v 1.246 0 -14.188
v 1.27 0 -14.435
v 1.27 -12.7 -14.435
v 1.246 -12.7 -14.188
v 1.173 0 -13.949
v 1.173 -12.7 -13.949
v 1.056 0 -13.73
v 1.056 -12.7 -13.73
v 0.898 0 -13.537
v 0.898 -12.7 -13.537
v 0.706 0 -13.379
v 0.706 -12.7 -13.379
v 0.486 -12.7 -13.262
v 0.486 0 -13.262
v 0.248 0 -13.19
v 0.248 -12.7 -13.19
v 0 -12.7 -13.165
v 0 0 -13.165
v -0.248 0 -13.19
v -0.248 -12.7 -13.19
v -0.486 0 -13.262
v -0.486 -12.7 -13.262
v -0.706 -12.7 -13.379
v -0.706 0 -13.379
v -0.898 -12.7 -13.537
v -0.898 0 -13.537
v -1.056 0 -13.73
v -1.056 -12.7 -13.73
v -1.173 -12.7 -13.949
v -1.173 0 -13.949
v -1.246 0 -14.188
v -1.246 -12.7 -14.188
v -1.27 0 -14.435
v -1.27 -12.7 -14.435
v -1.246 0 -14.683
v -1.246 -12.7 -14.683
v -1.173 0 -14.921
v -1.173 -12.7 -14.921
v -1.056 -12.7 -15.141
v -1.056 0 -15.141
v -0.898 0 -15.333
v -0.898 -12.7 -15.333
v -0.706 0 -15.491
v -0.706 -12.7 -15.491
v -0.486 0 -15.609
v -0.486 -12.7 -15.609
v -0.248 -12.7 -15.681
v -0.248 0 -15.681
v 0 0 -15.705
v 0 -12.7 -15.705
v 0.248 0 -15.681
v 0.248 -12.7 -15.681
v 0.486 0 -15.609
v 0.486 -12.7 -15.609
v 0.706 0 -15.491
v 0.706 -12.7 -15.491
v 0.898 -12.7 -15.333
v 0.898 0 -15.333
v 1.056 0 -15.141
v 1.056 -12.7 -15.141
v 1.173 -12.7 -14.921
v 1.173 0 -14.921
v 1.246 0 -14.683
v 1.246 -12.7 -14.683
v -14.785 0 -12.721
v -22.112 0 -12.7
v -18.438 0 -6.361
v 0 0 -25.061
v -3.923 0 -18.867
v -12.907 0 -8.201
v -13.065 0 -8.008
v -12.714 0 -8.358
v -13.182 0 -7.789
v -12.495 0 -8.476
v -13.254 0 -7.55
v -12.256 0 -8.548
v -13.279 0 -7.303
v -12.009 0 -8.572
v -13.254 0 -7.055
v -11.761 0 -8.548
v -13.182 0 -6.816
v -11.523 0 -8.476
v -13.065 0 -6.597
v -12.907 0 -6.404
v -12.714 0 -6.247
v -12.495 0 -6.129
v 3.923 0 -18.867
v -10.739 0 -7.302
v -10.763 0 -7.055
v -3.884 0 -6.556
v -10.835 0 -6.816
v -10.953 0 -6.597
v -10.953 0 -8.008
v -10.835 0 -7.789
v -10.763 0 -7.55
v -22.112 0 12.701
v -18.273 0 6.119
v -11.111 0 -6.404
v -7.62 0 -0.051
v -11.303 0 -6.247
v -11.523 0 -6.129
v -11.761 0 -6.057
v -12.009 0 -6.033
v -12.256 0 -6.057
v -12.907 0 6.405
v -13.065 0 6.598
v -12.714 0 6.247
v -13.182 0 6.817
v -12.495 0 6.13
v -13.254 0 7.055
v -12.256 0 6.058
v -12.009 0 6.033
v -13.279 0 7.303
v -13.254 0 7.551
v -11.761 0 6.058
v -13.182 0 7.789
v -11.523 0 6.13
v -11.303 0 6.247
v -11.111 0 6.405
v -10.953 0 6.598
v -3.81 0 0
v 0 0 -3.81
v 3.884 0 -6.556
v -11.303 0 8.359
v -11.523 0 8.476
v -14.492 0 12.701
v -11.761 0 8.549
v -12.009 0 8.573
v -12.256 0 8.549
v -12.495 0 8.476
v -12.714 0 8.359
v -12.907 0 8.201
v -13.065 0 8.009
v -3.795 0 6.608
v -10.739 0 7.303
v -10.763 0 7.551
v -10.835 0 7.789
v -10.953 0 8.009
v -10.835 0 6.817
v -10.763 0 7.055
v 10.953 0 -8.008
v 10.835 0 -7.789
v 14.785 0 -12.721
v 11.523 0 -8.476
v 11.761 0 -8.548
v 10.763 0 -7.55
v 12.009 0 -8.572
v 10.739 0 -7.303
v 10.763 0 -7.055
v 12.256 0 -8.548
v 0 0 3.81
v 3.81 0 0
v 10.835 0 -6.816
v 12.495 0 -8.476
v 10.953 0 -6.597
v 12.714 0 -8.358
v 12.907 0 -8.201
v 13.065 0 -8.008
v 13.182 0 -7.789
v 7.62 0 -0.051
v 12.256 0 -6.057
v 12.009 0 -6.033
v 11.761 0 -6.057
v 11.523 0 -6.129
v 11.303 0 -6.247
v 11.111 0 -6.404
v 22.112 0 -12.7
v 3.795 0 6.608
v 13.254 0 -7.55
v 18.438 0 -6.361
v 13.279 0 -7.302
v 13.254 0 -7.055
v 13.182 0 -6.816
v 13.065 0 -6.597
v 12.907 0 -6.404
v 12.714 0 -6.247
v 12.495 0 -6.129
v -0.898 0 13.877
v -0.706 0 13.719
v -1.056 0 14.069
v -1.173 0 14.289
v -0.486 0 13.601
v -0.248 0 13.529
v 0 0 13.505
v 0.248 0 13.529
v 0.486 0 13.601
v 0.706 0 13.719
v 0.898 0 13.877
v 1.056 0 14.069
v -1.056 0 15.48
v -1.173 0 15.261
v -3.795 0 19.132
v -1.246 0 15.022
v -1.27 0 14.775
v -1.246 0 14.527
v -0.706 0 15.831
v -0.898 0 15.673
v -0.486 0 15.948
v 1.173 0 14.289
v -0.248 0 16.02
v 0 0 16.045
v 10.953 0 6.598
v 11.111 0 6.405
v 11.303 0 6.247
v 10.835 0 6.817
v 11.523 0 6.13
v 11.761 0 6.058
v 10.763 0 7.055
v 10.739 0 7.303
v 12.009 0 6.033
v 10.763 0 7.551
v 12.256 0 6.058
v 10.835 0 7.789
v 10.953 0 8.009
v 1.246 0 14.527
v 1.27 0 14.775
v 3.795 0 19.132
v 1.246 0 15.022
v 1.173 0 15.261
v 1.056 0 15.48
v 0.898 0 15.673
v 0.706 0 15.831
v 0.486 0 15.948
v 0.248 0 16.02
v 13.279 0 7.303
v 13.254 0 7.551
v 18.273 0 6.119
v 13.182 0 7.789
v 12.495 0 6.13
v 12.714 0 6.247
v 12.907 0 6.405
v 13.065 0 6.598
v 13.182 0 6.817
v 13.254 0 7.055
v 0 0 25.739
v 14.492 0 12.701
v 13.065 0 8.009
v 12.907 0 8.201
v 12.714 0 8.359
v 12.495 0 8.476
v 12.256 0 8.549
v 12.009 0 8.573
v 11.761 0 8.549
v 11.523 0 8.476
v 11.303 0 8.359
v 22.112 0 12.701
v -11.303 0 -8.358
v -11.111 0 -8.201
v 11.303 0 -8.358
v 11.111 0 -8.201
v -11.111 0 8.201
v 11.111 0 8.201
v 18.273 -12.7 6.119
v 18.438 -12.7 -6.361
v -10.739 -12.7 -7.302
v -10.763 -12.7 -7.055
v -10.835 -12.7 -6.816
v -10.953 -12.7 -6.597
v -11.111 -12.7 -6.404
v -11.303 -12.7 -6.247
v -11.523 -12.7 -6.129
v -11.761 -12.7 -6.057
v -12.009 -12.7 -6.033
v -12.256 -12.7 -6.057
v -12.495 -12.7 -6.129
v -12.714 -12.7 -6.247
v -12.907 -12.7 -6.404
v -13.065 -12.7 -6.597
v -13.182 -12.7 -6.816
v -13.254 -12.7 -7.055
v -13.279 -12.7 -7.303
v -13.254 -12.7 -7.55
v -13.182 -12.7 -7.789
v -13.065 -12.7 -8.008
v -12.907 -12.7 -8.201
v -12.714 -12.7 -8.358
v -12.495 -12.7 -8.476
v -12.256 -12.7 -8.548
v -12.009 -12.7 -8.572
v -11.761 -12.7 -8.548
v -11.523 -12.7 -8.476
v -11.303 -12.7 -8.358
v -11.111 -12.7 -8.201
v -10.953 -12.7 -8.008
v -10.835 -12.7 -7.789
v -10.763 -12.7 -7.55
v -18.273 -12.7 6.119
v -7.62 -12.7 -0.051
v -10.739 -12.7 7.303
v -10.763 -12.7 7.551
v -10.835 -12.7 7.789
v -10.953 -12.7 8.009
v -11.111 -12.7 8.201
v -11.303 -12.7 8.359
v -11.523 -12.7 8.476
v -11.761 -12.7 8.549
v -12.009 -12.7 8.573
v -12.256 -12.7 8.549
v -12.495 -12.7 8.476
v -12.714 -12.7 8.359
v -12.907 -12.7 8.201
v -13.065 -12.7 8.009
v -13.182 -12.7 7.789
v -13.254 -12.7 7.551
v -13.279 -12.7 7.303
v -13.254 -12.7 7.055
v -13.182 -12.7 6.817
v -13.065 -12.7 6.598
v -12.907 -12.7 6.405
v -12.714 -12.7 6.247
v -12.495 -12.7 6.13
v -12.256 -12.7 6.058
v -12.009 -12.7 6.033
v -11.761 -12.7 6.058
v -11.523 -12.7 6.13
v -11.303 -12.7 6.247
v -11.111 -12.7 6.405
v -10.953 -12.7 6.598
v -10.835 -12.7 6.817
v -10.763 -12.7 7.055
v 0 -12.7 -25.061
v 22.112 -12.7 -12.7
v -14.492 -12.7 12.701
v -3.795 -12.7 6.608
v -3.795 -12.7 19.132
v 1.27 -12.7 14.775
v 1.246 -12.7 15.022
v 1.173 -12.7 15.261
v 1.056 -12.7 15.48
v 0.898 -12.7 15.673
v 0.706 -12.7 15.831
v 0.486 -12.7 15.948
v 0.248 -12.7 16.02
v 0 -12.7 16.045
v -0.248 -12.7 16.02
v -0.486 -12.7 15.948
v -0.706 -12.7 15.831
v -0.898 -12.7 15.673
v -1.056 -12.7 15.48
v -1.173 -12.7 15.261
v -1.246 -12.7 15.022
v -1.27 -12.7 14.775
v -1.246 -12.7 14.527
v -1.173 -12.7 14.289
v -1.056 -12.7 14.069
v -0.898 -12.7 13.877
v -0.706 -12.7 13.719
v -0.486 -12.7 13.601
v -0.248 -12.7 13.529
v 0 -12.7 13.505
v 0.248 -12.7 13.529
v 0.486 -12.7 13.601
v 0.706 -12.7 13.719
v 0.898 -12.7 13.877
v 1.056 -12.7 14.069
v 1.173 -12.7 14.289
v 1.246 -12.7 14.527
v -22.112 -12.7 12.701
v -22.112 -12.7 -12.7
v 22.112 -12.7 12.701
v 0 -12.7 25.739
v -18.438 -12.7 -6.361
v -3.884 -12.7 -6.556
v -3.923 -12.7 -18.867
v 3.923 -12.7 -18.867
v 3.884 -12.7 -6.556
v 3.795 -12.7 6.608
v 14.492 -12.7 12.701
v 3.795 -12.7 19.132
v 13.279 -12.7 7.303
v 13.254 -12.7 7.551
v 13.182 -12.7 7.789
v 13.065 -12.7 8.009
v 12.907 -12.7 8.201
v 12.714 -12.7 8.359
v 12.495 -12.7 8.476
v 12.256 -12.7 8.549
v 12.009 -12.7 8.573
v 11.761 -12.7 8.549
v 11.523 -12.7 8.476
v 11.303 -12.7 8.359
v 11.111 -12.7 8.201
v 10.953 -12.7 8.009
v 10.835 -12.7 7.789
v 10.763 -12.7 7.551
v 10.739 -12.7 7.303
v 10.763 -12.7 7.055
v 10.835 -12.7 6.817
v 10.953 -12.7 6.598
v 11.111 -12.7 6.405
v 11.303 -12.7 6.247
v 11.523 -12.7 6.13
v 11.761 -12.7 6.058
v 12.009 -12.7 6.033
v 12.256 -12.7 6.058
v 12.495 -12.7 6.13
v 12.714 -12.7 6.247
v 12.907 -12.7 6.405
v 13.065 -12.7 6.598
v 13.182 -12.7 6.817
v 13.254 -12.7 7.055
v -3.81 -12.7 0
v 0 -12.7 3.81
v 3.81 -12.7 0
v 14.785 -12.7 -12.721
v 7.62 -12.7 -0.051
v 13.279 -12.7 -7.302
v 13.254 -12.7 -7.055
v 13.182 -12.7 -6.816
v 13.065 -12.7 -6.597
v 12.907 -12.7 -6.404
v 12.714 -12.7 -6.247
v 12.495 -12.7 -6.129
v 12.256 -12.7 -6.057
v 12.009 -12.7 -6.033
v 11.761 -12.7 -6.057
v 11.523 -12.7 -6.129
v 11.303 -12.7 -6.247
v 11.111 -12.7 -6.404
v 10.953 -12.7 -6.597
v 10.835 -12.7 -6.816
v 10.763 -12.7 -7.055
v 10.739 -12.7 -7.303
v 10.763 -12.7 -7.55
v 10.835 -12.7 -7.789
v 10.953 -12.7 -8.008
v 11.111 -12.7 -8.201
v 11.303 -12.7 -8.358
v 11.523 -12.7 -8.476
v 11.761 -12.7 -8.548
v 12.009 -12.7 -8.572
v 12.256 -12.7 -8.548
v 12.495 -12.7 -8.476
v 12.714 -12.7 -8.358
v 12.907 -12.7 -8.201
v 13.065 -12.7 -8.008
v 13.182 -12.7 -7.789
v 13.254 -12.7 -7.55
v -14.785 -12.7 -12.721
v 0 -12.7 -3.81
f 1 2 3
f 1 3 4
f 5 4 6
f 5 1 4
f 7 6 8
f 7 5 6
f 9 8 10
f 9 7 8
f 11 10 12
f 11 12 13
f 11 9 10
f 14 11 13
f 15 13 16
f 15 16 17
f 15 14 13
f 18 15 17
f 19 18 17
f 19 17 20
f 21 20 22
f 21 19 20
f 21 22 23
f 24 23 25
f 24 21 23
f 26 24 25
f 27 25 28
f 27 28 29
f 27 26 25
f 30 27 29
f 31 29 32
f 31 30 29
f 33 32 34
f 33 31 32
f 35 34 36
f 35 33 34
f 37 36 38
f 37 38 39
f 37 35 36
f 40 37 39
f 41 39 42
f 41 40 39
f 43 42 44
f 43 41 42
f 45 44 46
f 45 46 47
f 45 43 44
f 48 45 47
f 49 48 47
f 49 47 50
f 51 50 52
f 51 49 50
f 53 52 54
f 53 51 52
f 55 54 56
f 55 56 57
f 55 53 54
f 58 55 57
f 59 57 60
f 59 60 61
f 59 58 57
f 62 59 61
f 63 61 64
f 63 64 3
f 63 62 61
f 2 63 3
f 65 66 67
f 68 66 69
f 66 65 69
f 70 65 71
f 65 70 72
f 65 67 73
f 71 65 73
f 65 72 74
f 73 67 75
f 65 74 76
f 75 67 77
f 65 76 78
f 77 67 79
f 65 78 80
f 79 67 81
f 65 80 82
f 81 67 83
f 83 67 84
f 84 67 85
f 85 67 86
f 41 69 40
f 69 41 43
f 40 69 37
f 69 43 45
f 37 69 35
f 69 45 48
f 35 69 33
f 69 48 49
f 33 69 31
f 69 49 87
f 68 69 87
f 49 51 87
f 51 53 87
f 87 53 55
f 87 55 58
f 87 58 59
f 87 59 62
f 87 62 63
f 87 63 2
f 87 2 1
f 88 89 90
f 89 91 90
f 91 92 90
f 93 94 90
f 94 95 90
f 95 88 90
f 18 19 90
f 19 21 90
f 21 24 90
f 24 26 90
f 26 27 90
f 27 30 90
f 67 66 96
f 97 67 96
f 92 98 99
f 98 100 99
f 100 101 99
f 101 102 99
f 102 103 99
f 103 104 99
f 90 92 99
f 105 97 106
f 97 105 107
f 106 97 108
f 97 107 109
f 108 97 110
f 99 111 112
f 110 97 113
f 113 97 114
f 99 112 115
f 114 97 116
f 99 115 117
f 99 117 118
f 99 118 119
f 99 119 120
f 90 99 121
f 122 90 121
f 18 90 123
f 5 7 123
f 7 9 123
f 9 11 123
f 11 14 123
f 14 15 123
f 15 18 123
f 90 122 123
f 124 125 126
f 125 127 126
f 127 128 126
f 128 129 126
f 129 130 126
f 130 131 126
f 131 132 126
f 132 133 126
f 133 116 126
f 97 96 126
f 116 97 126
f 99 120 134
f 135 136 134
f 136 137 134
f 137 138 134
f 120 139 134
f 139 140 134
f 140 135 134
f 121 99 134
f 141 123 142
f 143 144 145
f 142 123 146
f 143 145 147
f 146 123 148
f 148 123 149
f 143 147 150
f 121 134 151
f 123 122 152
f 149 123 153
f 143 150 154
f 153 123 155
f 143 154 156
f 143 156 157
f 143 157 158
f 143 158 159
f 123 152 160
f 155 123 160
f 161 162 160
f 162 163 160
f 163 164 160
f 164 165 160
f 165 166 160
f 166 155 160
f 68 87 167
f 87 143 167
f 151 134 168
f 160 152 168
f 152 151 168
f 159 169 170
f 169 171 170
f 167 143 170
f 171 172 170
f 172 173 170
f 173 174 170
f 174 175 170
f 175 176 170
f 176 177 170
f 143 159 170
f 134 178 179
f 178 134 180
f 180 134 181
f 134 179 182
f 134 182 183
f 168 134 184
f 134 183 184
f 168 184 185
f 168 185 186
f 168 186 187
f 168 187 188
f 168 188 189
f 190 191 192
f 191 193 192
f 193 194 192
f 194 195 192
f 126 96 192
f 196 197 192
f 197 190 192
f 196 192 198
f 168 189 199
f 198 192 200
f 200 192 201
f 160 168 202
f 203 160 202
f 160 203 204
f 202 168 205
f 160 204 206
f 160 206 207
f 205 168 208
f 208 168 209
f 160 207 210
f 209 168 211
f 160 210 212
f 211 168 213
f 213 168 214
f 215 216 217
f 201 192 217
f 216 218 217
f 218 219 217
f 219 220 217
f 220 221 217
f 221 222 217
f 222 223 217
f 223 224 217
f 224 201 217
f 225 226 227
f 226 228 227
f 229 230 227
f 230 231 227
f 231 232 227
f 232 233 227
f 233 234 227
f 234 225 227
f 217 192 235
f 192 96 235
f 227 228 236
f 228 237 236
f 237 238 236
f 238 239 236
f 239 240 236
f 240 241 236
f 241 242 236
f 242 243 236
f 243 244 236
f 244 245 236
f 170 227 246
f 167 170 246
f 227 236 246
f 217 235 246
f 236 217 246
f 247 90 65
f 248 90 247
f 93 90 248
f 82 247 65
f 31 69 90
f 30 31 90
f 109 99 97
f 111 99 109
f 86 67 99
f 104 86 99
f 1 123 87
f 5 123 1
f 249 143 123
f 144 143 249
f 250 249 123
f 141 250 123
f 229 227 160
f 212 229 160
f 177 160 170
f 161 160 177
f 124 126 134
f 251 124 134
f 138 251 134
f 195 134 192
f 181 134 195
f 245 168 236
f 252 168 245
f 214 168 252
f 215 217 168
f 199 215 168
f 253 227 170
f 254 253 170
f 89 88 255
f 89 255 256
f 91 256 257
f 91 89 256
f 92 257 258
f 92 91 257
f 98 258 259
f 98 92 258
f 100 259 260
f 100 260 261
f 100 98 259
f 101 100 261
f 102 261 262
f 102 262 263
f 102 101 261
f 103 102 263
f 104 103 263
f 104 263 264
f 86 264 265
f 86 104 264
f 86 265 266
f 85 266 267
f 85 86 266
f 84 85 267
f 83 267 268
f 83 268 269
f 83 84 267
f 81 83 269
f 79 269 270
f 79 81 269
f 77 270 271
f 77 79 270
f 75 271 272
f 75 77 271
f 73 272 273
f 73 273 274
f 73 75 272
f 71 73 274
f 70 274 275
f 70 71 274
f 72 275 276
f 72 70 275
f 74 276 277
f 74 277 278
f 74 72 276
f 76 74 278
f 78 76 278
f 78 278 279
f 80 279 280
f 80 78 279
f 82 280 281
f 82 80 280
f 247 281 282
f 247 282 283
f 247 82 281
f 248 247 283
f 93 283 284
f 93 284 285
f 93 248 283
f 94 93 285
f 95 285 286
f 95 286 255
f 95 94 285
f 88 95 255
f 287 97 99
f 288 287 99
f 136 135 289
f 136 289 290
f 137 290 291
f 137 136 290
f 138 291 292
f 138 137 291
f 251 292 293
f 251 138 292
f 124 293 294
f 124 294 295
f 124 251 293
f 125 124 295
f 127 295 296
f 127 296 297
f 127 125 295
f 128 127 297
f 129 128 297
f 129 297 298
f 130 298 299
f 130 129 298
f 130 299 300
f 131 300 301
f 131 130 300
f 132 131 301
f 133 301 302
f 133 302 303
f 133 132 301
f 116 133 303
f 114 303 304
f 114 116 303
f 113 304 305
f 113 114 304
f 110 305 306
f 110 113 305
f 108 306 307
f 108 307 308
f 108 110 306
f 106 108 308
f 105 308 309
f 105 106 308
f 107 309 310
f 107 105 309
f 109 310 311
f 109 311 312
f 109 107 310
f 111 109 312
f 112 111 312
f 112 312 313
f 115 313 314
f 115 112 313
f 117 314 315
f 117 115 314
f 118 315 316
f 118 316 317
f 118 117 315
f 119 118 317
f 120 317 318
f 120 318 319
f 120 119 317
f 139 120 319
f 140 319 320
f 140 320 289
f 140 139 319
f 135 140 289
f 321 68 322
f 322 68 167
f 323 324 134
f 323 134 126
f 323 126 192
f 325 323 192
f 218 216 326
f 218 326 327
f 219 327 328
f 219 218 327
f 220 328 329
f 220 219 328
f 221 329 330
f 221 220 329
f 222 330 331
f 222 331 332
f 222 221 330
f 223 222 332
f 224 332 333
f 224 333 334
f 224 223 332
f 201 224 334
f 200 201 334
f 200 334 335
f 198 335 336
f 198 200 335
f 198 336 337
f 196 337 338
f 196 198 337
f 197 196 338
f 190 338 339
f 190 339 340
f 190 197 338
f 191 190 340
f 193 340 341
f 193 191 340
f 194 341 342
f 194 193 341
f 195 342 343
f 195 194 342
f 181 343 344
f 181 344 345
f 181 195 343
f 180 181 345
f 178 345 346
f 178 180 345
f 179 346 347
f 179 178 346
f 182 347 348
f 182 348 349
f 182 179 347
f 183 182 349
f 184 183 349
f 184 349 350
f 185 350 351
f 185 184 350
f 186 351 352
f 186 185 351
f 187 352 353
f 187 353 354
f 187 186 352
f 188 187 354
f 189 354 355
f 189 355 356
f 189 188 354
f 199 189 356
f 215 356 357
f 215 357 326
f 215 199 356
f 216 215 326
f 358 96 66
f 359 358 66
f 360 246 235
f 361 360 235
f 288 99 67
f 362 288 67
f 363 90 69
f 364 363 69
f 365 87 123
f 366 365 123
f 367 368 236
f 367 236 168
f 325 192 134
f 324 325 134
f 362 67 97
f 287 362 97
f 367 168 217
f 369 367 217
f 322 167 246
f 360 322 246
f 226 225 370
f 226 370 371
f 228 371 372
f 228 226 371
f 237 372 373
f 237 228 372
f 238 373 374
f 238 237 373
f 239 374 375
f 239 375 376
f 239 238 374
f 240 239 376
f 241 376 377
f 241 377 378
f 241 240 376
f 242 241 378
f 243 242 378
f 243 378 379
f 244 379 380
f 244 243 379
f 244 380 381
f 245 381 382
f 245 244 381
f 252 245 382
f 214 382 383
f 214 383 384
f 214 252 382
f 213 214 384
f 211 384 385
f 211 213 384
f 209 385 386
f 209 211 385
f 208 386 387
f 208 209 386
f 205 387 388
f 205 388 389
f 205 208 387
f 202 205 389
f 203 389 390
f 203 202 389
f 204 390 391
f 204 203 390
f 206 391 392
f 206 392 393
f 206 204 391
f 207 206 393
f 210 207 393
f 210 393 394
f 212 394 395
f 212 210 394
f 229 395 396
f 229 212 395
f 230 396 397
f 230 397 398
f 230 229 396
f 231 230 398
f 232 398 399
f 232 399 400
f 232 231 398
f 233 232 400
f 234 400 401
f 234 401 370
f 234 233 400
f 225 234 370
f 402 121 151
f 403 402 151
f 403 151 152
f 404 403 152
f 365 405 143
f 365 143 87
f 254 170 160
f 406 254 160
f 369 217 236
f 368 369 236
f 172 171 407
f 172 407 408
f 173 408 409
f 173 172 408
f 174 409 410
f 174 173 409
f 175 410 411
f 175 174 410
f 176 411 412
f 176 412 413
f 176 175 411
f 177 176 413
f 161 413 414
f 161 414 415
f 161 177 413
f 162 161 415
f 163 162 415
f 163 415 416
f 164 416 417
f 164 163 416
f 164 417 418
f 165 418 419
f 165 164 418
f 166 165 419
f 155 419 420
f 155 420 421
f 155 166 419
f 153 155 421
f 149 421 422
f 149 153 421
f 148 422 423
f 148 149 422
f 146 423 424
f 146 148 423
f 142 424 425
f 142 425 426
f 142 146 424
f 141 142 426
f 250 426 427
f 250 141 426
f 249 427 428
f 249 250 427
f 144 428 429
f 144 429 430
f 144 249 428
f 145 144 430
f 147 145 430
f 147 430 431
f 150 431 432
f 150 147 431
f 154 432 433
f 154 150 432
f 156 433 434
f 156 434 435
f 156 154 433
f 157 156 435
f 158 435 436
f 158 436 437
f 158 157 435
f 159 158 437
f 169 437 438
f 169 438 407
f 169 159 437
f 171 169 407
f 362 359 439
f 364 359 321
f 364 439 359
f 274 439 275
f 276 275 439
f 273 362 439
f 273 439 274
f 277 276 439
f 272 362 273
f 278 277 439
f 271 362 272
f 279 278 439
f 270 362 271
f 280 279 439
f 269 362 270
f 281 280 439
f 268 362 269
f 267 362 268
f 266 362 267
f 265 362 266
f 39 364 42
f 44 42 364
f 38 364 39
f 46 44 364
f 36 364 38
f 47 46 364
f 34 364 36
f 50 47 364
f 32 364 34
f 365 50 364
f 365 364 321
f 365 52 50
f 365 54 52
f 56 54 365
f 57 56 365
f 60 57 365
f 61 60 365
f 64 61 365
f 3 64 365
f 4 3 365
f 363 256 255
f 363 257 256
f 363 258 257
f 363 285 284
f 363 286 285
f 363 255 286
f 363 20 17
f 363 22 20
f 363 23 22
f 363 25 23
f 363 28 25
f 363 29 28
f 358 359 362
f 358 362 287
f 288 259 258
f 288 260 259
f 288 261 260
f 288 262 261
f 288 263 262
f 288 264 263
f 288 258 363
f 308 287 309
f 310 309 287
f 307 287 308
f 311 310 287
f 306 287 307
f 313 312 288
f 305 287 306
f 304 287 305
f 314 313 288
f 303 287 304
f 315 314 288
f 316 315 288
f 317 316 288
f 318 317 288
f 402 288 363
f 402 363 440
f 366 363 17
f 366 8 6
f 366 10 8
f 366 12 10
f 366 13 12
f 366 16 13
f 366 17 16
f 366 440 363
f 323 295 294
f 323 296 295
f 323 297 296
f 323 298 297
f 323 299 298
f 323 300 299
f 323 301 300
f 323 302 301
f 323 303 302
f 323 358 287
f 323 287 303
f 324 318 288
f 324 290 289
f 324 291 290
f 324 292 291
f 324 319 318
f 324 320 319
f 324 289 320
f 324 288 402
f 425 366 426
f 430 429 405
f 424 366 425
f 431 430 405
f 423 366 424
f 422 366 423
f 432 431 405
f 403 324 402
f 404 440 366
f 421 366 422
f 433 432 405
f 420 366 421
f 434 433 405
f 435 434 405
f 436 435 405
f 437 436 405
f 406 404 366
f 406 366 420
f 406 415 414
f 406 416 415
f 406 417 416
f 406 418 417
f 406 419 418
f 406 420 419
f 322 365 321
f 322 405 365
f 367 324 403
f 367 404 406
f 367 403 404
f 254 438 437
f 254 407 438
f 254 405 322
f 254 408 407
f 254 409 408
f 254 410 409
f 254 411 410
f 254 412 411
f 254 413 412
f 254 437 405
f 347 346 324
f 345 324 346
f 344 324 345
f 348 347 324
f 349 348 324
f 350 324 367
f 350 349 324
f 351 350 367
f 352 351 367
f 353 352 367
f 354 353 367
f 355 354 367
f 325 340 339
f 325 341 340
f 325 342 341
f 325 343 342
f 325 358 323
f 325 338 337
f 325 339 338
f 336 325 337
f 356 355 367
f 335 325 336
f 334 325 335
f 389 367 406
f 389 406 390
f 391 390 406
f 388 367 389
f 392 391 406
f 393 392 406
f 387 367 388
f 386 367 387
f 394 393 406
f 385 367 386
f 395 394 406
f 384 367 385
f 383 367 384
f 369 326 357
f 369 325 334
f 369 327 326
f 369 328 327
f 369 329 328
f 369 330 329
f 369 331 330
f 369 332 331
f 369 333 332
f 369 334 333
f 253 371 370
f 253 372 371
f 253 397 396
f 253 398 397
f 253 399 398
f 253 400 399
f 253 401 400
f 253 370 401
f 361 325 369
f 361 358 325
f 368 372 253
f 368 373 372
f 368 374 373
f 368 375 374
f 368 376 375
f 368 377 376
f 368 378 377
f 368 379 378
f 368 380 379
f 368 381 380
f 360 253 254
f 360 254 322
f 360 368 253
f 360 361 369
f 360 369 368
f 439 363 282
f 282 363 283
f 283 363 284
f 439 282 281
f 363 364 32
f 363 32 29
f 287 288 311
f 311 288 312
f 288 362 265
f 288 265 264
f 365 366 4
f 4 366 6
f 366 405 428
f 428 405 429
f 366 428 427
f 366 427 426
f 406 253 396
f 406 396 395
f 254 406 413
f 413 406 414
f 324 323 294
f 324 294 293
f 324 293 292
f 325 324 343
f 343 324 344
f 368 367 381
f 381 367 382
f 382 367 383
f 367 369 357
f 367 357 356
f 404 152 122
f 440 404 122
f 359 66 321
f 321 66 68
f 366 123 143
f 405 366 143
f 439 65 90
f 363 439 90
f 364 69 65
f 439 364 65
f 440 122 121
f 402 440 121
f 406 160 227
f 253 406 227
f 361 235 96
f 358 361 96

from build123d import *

# Parameters (mm, degrees)
F0_R     = 1.27
F1_DEPTH = 12.7


with BuildPart() as f1:
    # F0 (on Front) → F1 (new body)
    with BuildSketch(Plane.XZ):
        Polygon((0, 25.739086), (-22.112327, 12.70128), (-22.112327, -12.7), (0, -25.060914), (22.112327, -12.7), (22.112327, 12.70128), align=None)
        Polygon((-3.883768, -6.55597), (-3.92257, -18.866995), (-14.785223, -12.720766), align=None, mode=Mode.SUBTRACT)
        with Locations((0, -14.435457)):
            Circle(F0_R, mode=Mode.SUBTRACT)
        with Locations((-12.008663, -7.3025)):
            Circle(F0_R, mode=Mode.SUBTRACT)
        Polygon((-18.273105, 6.119124), (-7.619829, -0.05101), (-18.438062, -6.360705), align=None, mode=Mode.SUBTRACT)
        Polygon((-3.81, 0), (0, 3.81), (3.81, 0), (0, -3.81), align=None, mode=Mode.SUBTRACT)
        Polygon((3.883768, -6.55597), (14.785223, -12.720766), (3.92257, -18.866995), align=None, mode=Mode.SUBTRACT)
        with Locations((12.008663, -7.3025)):
            Circle(F0_R, mode=Mode.SUBTRACT)
        Polygon((18.273105, 6.119124), (18.438062, -6.360705), (7.619829, -0.05101), align=None, mode=Mode.SUBTRACT)
        with Locations((-12.008663, 7.30314)):
            Circle(F0_R, mode=Mode.SUBTRACT)
        Polygon((-14.492327, 12.70128), (-3.795361, 19.131543), (-3.795073, 6.607709), align=None, mode=Mode.SUBTRACT)
        with Locations((0, 14.774543)):
            Circle(F0_R, mode=Mode.SUBTRACT)
        Polygon((3.795073, 6.607709), (3.795361, 19.131543), (14.492327, 12.70128), align=None, mode=Mode.SUBTRACT)
        with Locations((12.008663, 7.30314)):
            Circle(F0_R, mode=Mode.SUBTRACT)
    extrude(amount=F1_DEPTH)


solid = f1.part
